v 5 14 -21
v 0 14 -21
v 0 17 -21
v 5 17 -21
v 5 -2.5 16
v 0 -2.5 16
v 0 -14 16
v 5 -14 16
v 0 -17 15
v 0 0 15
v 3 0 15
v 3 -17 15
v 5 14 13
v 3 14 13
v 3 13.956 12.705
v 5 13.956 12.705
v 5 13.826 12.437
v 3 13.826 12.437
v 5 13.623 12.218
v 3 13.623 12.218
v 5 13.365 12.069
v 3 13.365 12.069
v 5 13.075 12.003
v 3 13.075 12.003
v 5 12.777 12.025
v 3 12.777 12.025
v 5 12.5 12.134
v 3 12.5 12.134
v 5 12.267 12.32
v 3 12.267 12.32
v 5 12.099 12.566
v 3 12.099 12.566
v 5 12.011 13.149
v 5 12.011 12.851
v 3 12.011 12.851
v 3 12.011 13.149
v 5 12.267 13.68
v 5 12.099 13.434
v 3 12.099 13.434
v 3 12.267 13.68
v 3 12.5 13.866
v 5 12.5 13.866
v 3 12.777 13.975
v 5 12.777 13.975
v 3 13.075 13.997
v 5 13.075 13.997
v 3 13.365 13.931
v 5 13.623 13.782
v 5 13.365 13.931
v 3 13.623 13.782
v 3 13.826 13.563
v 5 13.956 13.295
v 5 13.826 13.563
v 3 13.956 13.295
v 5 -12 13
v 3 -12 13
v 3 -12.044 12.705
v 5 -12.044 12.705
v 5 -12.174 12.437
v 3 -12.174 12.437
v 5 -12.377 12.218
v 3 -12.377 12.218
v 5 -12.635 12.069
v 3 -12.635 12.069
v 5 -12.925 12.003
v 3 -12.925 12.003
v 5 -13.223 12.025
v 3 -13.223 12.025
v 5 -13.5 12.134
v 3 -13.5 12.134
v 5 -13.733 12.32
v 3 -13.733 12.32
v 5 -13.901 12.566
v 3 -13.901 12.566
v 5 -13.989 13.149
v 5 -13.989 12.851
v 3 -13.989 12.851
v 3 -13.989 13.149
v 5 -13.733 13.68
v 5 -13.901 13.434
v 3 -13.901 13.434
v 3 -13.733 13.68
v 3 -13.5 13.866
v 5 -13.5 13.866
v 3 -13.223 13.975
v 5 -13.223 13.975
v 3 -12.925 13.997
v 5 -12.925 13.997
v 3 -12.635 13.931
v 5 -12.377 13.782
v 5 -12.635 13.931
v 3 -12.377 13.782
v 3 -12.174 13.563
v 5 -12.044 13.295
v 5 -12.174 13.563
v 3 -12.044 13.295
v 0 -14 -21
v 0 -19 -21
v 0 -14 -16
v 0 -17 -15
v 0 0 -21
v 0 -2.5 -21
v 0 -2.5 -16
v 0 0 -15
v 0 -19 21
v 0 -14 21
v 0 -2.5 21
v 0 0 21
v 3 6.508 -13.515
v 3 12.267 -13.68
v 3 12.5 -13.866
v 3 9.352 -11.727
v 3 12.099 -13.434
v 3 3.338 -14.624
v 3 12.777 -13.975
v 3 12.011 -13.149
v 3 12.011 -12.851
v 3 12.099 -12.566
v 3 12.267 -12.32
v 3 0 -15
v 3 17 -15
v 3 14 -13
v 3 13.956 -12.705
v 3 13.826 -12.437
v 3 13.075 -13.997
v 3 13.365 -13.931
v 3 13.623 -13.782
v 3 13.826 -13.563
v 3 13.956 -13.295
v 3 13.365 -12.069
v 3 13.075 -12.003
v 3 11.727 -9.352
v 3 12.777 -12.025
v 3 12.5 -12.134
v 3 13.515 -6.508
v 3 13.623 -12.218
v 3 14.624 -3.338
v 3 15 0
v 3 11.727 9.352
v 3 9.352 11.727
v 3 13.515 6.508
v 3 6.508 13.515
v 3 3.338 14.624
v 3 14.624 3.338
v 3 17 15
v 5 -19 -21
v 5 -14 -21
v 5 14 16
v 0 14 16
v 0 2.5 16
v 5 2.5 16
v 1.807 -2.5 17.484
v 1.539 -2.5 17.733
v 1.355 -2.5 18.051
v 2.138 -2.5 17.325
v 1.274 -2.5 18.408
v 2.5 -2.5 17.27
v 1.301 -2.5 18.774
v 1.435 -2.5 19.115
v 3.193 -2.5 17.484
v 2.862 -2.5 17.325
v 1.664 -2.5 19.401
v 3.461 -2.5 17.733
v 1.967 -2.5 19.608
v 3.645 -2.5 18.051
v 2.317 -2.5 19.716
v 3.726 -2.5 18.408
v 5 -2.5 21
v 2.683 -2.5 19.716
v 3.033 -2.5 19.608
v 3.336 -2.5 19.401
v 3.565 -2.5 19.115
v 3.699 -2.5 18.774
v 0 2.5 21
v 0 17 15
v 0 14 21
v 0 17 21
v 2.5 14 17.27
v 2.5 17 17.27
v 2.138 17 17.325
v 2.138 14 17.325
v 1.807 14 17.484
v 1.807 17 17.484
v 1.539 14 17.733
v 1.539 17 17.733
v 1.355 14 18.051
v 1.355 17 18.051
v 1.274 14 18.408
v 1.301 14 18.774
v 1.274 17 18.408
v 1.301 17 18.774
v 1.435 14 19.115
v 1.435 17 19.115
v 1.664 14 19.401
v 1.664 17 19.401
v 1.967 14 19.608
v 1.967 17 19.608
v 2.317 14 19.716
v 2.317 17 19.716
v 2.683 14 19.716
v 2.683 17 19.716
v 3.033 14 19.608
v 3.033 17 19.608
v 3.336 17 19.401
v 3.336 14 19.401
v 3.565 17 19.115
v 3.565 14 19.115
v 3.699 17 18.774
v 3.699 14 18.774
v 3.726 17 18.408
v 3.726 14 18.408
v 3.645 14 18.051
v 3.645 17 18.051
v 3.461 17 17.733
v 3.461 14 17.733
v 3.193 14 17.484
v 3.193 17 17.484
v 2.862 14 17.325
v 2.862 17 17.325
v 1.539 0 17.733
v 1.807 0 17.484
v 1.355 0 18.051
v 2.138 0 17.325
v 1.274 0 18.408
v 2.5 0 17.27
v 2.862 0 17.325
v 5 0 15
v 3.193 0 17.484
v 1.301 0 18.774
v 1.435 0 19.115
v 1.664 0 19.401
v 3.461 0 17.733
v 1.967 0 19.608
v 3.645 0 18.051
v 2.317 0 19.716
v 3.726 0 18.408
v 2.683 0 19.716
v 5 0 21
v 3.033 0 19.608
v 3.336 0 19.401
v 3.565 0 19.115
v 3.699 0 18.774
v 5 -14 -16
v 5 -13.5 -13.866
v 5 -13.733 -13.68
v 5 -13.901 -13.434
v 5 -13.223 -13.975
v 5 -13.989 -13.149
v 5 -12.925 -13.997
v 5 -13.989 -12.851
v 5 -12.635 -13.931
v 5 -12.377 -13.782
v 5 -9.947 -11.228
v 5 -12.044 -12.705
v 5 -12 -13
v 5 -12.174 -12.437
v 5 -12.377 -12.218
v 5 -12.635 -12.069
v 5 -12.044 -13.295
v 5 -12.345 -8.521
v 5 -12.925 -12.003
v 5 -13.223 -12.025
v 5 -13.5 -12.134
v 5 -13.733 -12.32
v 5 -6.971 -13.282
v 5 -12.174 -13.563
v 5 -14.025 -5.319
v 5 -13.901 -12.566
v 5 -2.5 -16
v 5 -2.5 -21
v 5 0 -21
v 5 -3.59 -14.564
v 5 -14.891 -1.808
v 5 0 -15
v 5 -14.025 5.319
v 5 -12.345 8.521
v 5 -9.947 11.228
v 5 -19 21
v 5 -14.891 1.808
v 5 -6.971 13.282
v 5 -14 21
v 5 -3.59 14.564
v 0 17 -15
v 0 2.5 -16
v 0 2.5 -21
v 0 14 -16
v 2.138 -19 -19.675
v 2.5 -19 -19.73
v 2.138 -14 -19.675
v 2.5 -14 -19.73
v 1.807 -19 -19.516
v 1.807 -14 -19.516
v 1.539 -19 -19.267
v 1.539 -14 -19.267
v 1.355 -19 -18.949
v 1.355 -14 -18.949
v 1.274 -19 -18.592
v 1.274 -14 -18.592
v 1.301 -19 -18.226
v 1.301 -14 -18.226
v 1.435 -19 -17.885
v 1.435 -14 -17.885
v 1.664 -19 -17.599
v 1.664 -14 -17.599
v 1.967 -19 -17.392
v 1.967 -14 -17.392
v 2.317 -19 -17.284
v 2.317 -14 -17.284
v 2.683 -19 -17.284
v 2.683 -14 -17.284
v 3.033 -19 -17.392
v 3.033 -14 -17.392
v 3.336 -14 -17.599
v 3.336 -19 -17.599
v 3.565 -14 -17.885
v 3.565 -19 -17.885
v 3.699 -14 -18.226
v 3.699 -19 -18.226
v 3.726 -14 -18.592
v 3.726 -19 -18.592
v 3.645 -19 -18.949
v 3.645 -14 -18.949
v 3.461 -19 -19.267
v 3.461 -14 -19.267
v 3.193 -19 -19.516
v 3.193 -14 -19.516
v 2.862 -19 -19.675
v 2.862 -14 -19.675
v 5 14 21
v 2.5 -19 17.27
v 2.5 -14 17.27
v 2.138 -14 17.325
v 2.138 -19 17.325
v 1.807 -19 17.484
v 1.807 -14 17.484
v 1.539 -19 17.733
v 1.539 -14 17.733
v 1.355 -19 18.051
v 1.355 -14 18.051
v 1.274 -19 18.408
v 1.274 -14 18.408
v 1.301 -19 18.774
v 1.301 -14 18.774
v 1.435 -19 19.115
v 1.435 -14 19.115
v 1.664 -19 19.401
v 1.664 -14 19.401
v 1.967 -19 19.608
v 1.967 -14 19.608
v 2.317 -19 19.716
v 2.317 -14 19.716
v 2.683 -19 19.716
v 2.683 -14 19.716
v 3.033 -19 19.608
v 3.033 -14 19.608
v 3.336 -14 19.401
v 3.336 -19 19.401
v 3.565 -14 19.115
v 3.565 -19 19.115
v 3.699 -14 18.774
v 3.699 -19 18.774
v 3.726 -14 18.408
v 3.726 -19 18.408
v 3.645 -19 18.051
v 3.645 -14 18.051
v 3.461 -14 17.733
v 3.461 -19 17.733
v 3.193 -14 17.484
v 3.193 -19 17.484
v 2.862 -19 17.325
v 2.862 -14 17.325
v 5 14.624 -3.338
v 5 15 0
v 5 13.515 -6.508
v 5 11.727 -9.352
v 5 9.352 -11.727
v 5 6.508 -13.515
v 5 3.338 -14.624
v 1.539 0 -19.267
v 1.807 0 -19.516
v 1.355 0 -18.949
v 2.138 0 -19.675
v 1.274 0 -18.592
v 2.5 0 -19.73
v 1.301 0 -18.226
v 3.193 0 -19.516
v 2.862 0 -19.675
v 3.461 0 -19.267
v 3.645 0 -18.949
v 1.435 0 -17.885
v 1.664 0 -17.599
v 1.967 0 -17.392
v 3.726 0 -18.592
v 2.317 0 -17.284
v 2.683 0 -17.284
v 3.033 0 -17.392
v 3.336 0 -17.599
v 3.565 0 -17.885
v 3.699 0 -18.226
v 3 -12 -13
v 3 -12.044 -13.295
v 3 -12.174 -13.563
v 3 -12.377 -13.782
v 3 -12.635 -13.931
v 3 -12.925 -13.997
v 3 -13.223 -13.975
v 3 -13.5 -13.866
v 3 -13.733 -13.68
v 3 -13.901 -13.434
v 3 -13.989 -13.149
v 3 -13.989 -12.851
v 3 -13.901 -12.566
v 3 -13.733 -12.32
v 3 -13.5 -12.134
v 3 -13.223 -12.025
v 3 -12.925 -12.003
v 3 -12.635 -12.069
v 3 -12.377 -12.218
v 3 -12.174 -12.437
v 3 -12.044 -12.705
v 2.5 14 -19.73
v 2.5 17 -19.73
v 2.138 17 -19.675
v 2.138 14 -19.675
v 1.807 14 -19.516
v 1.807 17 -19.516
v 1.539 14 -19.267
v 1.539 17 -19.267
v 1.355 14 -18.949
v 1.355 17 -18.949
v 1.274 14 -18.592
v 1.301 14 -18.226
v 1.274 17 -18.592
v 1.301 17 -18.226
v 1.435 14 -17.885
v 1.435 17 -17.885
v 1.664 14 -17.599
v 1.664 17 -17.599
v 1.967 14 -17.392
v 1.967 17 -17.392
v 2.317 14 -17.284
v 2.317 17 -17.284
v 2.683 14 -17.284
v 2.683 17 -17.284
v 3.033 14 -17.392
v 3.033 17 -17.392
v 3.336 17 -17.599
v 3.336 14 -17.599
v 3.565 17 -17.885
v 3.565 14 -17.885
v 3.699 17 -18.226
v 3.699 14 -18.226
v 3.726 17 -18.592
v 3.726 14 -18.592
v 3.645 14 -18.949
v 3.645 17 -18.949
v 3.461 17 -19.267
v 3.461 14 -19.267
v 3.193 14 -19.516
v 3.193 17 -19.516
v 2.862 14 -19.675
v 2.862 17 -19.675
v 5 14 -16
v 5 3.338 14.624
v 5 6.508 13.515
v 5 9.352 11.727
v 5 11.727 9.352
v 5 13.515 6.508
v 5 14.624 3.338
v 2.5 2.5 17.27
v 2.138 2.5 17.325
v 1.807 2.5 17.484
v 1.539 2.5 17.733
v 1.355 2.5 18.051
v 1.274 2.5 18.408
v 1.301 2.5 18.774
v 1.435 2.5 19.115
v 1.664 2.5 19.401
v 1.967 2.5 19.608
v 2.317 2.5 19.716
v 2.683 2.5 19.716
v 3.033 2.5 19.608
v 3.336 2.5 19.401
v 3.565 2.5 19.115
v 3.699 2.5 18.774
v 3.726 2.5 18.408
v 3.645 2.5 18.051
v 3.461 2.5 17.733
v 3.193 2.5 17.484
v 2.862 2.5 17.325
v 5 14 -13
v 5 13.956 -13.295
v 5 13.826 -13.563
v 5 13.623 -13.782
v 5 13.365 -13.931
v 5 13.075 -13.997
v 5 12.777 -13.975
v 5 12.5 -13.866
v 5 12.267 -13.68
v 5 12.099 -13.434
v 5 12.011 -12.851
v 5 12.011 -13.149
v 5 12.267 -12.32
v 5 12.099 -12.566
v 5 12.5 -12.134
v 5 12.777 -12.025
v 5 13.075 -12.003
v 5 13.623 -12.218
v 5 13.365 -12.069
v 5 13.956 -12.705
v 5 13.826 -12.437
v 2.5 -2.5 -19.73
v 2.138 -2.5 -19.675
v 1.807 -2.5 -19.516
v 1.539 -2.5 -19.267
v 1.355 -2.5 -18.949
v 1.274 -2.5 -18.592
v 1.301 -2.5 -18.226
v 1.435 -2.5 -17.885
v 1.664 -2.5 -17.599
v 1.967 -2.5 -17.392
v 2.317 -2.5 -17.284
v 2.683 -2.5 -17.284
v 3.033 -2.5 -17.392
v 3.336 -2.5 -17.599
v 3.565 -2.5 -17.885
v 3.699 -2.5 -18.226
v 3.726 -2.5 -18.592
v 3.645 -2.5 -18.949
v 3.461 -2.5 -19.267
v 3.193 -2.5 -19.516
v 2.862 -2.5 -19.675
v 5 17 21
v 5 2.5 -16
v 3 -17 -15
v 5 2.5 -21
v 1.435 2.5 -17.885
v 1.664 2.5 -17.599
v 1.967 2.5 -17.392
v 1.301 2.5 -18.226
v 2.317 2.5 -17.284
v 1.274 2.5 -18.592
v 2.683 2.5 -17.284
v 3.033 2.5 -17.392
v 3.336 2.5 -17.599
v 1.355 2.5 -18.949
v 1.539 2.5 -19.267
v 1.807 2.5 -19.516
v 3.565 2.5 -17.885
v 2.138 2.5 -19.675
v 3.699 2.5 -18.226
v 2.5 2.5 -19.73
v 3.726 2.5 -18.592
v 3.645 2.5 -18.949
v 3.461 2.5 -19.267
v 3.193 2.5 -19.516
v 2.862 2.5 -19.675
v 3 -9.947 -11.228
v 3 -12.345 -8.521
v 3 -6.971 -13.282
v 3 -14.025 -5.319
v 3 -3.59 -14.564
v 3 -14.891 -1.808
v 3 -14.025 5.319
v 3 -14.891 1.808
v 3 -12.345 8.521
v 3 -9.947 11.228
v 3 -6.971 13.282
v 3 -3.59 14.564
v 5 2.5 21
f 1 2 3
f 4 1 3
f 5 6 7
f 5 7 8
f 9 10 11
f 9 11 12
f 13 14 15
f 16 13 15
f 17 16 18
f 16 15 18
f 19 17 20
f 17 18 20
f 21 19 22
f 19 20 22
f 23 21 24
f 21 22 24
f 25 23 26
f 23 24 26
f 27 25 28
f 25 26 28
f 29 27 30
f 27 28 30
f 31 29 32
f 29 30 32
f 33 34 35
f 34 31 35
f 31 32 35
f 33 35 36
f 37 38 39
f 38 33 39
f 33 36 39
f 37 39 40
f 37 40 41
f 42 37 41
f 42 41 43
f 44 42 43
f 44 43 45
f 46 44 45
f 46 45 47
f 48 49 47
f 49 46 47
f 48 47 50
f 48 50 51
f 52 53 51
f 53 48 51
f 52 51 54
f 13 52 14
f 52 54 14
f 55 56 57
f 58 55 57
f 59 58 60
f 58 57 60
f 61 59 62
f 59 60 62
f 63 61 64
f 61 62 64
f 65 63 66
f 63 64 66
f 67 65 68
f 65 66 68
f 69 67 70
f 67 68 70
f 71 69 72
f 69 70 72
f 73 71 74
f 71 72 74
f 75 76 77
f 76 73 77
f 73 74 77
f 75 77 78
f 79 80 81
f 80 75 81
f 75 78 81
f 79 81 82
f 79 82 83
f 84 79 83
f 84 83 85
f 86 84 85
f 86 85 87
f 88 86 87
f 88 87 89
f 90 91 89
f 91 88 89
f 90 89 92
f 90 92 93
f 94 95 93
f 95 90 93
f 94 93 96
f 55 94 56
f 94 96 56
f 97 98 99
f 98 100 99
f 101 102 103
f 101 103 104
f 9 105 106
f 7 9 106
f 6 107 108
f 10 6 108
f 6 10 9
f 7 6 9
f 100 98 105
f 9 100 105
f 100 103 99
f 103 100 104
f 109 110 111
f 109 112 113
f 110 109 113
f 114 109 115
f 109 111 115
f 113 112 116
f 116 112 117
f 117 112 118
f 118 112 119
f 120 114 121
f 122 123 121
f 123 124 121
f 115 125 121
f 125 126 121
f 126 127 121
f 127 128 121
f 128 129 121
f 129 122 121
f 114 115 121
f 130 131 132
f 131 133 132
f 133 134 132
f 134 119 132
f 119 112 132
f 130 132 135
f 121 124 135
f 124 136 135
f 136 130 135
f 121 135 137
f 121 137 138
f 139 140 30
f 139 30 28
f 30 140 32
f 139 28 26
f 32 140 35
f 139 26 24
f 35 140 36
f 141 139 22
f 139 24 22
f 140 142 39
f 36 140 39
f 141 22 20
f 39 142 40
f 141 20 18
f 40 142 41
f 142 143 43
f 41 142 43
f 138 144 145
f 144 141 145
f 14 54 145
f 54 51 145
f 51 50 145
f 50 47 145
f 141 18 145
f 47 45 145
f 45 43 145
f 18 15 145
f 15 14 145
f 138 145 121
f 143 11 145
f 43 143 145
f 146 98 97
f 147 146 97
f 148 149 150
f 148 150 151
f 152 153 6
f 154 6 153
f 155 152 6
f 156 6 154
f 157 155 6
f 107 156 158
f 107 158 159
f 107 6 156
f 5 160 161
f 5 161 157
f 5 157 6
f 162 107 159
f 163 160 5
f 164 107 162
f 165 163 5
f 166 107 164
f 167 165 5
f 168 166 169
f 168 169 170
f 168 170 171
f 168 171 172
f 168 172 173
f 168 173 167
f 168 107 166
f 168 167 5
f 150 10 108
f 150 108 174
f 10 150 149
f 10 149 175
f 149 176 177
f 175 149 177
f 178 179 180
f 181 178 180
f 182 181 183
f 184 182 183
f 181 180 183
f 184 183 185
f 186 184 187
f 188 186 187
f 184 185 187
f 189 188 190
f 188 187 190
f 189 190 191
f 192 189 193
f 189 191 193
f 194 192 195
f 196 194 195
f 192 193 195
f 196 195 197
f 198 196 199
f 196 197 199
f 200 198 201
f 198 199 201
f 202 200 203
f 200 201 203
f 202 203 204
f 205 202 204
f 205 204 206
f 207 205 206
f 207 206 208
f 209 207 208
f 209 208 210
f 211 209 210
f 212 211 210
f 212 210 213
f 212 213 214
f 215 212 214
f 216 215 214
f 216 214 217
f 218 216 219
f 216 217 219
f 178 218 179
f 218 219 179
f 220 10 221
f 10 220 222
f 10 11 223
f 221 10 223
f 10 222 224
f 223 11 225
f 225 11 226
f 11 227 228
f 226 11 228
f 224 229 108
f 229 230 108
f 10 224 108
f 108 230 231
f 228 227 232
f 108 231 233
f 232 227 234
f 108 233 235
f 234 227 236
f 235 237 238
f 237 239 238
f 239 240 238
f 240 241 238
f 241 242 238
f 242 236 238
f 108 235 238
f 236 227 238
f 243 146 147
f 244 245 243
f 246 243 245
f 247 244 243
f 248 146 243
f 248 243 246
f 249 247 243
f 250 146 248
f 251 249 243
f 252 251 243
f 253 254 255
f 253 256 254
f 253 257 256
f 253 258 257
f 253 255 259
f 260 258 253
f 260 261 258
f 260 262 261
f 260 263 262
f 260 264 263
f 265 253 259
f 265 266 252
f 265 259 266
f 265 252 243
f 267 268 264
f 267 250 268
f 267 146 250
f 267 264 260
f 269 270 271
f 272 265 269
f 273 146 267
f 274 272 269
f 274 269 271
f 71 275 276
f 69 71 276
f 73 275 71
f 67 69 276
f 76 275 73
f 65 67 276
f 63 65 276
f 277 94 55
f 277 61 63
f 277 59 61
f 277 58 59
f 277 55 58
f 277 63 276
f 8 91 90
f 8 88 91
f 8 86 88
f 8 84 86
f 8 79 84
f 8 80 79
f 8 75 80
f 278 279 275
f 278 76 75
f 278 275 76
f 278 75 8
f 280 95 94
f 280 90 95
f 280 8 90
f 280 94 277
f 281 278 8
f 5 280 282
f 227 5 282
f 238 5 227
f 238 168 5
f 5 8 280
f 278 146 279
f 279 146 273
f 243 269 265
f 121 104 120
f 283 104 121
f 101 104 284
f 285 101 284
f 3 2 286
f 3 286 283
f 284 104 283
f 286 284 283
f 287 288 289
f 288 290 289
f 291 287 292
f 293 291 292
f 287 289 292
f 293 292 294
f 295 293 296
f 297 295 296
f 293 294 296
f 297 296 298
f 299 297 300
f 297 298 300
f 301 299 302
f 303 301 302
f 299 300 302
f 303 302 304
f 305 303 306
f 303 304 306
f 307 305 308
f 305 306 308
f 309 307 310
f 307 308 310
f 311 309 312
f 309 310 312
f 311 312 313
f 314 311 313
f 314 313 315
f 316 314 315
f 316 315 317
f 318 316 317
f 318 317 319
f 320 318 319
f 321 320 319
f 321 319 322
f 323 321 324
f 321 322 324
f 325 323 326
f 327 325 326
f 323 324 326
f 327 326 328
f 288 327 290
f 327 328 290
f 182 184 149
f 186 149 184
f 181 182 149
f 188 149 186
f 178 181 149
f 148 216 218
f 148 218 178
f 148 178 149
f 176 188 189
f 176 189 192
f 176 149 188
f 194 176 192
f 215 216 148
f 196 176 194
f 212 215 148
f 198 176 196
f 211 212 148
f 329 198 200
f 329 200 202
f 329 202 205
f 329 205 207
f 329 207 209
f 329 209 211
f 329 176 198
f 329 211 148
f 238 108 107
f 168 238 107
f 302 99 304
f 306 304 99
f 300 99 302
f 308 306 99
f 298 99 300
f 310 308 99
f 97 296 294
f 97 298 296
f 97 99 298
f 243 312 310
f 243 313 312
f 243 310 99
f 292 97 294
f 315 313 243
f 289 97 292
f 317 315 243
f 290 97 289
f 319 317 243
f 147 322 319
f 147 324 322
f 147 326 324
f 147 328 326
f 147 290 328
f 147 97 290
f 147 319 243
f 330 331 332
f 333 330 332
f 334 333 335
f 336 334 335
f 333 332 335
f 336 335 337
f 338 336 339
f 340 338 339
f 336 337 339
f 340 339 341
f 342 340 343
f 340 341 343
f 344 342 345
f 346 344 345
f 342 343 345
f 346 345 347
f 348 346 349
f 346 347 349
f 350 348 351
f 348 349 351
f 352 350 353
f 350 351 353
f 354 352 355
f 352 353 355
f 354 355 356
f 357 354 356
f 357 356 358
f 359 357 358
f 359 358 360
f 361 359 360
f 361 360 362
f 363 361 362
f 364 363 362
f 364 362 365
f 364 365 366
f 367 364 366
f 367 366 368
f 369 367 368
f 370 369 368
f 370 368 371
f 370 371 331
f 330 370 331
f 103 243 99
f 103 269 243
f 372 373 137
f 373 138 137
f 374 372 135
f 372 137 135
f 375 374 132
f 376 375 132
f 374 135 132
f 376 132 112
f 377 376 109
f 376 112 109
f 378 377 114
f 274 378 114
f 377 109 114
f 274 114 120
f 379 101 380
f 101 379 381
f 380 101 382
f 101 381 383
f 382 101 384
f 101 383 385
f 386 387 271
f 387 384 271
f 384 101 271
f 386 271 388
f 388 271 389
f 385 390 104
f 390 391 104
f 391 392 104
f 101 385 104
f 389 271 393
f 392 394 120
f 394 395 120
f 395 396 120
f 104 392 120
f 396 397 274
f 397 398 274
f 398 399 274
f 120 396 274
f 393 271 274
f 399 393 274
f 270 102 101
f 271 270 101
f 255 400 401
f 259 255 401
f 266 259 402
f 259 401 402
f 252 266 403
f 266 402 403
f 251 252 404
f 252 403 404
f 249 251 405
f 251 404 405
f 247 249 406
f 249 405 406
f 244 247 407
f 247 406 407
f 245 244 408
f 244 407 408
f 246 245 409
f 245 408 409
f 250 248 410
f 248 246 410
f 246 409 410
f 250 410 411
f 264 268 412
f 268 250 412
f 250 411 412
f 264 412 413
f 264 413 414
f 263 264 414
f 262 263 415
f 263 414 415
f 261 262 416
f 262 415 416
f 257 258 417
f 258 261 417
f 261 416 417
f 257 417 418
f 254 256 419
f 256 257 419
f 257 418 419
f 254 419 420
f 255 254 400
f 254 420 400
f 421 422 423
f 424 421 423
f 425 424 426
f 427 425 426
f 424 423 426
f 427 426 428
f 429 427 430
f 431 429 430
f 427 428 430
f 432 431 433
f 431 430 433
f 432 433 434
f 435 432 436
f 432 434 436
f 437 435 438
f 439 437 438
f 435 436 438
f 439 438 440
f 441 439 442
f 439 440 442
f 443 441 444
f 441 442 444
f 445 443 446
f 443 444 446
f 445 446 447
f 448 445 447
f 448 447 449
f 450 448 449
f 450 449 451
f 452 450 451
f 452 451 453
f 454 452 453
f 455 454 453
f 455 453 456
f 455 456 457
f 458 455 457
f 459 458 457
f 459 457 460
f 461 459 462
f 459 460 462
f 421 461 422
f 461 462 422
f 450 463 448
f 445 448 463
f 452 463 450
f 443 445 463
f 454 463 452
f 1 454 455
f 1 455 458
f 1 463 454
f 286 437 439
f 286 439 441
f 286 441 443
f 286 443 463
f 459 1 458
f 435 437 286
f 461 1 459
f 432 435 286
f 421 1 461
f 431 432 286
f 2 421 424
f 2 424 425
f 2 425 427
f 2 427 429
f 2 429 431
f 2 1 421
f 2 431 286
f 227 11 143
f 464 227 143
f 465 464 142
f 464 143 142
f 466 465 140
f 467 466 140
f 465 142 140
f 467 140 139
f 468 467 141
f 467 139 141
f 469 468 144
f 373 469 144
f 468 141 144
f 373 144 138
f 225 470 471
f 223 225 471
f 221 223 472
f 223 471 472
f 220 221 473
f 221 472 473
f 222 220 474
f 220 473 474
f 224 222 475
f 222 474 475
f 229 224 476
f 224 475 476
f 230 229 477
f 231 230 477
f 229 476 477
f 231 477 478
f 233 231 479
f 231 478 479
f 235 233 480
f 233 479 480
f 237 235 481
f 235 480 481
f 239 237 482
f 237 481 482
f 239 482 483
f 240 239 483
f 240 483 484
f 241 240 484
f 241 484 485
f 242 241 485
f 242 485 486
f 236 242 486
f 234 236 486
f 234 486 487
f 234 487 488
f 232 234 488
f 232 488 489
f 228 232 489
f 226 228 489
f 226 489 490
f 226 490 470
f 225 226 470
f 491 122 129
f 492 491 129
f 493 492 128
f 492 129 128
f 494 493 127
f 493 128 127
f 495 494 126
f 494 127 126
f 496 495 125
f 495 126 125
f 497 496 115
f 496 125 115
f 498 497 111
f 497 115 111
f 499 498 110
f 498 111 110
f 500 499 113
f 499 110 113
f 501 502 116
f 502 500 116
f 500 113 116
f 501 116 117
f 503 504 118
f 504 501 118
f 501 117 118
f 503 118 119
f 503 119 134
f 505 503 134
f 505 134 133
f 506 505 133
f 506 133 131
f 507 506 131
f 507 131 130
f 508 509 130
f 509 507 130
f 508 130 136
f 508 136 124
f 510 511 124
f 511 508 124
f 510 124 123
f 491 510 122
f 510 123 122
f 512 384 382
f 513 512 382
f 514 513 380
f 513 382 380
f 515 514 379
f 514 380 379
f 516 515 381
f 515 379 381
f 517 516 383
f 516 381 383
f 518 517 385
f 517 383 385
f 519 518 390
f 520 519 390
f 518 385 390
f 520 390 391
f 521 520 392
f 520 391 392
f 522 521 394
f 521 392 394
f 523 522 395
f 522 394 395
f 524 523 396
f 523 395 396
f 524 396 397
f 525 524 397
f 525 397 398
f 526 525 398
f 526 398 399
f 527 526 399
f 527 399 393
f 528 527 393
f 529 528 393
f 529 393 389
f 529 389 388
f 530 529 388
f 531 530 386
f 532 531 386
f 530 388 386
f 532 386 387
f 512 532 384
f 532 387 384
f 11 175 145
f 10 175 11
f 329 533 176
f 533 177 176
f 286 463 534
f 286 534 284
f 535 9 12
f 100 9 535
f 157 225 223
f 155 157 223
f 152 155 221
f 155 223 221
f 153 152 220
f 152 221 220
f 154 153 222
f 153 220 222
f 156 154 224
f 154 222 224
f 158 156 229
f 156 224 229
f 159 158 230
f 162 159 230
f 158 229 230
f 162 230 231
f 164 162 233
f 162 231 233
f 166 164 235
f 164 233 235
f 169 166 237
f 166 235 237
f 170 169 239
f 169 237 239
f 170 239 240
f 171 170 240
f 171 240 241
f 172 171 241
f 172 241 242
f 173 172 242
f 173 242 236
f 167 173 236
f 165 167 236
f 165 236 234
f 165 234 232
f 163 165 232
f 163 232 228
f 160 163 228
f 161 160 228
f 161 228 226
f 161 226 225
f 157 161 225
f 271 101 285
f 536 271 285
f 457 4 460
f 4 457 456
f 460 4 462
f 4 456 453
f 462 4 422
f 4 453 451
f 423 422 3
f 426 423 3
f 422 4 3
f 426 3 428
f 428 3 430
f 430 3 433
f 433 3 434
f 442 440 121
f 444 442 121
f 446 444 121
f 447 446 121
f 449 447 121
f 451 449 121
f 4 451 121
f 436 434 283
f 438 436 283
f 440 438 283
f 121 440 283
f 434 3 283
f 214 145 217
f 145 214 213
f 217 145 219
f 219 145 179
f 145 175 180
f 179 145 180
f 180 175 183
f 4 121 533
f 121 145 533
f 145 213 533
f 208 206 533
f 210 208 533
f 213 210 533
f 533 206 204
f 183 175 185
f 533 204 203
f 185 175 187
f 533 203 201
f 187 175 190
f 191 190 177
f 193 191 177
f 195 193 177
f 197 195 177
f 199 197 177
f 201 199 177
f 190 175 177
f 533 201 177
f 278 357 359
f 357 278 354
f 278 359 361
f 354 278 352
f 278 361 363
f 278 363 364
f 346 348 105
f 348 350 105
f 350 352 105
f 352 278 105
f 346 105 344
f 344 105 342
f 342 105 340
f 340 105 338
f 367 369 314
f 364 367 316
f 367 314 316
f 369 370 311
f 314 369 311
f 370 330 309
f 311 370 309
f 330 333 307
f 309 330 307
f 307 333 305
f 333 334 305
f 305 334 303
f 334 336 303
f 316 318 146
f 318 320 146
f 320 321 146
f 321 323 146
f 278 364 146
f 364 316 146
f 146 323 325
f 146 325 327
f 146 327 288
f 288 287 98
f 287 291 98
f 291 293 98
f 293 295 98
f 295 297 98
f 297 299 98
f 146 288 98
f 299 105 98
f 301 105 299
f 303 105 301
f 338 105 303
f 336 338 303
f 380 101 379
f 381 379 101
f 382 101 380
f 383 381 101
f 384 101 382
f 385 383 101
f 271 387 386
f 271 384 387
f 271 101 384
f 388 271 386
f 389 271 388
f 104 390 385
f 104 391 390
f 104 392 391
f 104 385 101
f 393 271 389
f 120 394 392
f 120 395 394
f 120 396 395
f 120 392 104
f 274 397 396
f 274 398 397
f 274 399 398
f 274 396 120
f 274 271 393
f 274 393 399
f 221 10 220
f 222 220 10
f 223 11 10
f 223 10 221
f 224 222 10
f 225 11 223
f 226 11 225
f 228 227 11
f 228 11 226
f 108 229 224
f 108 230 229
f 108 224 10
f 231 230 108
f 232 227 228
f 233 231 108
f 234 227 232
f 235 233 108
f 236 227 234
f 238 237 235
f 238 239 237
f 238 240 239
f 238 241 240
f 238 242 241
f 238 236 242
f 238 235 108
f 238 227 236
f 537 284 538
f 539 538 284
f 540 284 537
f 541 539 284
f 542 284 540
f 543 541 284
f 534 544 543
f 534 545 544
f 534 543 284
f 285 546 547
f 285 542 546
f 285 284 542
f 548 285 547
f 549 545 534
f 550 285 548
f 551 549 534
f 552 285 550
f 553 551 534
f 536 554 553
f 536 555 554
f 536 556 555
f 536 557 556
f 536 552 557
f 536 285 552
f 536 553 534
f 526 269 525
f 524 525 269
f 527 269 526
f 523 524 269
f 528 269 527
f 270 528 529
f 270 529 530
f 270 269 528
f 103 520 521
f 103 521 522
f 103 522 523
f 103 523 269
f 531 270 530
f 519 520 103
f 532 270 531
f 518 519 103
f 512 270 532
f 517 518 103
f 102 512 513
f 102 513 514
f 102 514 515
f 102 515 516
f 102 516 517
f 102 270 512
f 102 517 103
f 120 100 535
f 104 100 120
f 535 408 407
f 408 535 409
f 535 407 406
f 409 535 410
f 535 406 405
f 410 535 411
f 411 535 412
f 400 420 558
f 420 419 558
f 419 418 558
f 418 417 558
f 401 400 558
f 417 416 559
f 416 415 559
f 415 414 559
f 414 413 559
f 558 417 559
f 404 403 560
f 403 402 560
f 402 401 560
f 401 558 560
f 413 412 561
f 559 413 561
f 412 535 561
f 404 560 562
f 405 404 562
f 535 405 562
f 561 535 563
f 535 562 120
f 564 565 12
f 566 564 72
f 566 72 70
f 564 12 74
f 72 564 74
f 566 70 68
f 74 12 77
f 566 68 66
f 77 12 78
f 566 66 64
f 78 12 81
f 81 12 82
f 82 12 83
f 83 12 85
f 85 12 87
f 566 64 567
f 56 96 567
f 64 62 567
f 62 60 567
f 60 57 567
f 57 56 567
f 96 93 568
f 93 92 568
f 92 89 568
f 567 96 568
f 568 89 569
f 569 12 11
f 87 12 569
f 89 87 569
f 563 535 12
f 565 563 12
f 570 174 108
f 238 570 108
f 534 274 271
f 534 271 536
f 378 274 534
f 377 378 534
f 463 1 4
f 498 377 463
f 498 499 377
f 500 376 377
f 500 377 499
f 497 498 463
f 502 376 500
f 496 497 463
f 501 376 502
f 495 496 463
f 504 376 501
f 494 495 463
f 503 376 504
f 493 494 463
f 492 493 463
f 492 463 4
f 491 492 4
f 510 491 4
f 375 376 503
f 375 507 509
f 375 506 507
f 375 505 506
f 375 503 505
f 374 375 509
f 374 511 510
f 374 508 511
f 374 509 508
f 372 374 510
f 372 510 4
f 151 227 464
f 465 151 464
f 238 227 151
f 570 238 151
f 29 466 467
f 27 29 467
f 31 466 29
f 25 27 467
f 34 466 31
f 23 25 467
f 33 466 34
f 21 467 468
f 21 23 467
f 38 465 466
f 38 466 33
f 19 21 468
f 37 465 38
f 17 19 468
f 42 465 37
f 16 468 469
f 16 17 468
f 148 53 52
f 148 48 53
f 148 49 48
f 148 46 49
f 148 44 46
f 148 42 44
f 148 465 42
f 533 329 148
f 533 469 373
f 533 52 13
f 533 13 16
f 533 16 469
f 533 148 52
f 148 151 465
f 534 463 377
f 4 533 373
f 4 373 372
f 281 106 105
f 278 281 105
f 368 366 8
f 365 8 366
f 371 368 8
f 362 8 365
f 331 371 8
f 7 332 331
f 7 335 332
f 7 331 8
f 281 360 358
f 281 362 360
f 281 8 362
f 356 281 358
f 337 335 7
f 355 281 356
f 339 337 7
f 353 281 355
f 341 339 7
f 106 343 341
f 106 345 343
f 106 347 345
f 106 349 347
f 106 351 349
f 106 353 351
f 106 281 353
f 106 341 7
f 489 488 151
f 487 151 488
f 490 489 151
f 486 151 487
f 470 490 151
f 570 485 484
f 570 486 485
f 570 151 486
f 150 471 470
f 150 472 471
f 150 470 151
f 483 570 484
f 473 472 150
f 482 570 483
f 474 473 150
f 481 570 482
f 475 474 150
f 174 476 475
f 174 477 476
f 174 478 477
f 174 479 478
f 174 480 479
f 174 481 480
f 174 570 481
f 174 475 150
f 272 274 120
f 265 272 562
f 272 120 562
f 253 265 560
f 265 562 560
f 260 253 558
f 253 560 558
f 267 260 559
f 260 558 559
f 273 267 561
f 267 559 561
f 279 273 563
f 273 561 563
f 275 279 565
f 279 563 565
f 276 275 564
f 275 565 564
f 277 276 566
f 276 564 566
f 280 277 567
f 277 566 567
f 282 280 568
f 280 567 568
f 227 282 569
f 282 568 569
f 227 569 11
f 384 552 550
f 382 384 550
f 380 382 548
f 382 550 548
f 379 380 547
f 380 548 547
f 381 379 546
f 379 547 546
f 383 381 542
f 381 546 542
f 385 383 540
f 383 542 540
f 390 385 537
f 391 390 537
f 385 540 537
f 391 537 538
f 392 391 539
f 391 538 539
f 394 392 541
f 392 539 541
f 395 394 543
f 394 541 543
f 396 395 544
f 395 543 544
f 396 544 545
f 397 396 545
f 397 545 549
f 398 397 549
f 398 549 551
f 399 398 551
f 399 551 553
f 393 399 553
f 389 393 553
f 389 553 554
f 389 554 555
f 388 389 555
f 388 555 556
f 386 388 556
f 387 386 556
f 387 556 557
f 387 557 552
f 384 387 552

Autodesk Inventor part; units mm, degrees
ref_plane "YZ Plane" through (0, 0, 0) normal (1, 0, 0) x (0, 1, 0)
ref_plane "XZ Plane" through (0, 0, 0) normal (0, 1, 0) x (-1, 0, 0)
ref_plane "XY Plane" through (0, 0, 0) normal (0, 0, 1) x (1, 0, 0)
sketch "Sketch1" plane through (0, 0, 0) normal (1, 0, 0) x (0, 1, 0)
  circle A0 centre (0, 0) radius 15
  line L0 (15, 15) -> (-15, 15)
  line L1 (-15, 15) -> (-15, -15) construction
  line L2 (-15, -15) -> (15, -15)
  line L3 (15, -15) -> (15, 15) construction
  line L4 (15, 15) -> (-15, -15) construction
  line L5 (-15, 15) -> (15, -15) construction
  line L6 (17, 21) -> (-17, 21)
  line L7 (-17, 21) -> (-17, -21)
  line L8 (-17, -21) -> (17, -21)
  line L9 (17, -21) -> (17, 21)
  line L10 (17, 21) -> (-17, -21) construction
  line L11 (-17, 21) -> (17, -21) construction
  circle A1 centre (13, -13) radius 1
  circle A2 centre (13, 13) radius 1
  circle A3 centre (-13, -13) radius 1
  circle A4 centre (-13, 13) radius 1
  line L12 (17, -15) -> (15, -15)
  line L13 (-15, -15) -> (-17, -15)
  line L14 (17, 15) -> (15, 15)
  line L15 (-15, 15) -> (-17, 15)
  line L16 (-17, 21) -> (-19, 21)
  line L17 (-19, 21) -> (-19, -21)
  line L18 (-19, -21) -> (-17, -21)
  line L19 (-17, -21) -> (-17, 21)
  point P0 (0, -15)
  point P1 (0, 15)
  dimension "d0" = 30
  dimension "d1" = 42
  dimension "d2" = 34
  dimension "d10" = 2
  dimension "d11" = 2
  dimension "d14" = 26
  dimension "d17" = 26
  dimension "d44" = 2
sketch "Sketch2" plane through (0, 0, 0) normal (0, 1, 0) x (-1, 0, 0)
  line L0 (190, 50) -> (-10, 50)
  line L1 (-10, 50) -> (-10, -50)
  line L2 (-10, -50) -> (190, -50)
  line L3 (190, -50) -> (190, 50)
  point P0 (0, 0)
  point P1 (-10, 0)
  dimension "d3" = 200
  dimension "d4" = 100
  dimension "d5" = 10
extrude "Extrusion1" add sketch "Sketch1" along normal blind 5 contours A0 | A0 L0 L14 L9 L12 L2 | L0 L15 L7 L6 L9 L14 | A0 L2 L13 L7 L15 L0 | L2 L12 L9 L8 L7 L13 | A1 | A2 | A3 | A4
extrude "Extrusion4" cut sketch "Sketch1" along normal blind 3 contours A0 L0 L14 L9 L12 L2 | A0 L2 L13 L7 L15 L0
extrude "Extrusion3" cut sketch "Sketch1" along normal blind 5 contours A0 | A1 | A2 | A3 | A4
sketch "Sketch3" plane through (0, -17, 21) normal (0, 0, 1) x (1, 0, 0)
  line L0 (0, 34) -> (0, 0) projected
  line L1 (0, 0) -> (5, 0) projected
  line L2 (5, 34) -> (5, 0) projected
  line L3 (0, 0) -> (0, 34) projected
  line L4 (5, 0) -> (5, 34) projected
  line L5 (0, 14.5) -> (5, 14.5)
  line L6 (5, 14.5) -> (5, 3)
  line L7 (5, 3) -> (0, 3)
  line L8 (0, 3) -> (0, 14.5)
  line L9 (0, 31) -> (5, 31)
  line L10 (5, 31) -> (5, 19.5)
  line L11 (5, 19.5) -> (0, 19.5)
  line L12 (0, 19.5) -> (0, 31)
  line L13 (0, 34) -> (5, 34) projected
  point P0 (0, 17)
  point P1 (0, 17)
  point P2 (0, 3)
  point P3 (5, 3)
  point P4 (0, 19.5)
  dimension "d26" = 3
  dimension "d27" = 5
  dimension "d29" = 2.5
  dimension "d43" = 3
extrude "Extrusion5" cut sketch "Sketch3" against normal blind 5 contours L9 L2 L11 L0 | L5 L2 L7 L0
mirror "Mirror1" about plane through (0, 0, 0) normal (0, 0, 1) of "Extrusion5"
extrude "Extrusion6" add sketch "Sketch1" along normal blind 5 contours L7 L18 L17 L16
sketch "Sketch5" plane through (0, -19, -21) normal (0, -1, 0) x (1, 0, 0)
  line L0 (0, 42) -> (5, 42) projected
  line L1 (0, 42) -> (0, 0) projected
  line L2 (0, 0) -> (5, 0) projected
  point P0 (0, 21)
  point P1 (2.5, 2.5)
  point P2 (2.5, 39.5)
  dimension "d54" = 2.5
  dimension "d55" = 2.5
  dimension "d56" = 2.5
  dimension "d57" = 2.5
hole "Hole2" at (2.5, -19, -18.5) at (2.5, -19, 18.5) direction (0, 1, 0) diameter 2.459 end through all thread size "M3x0.5" class "6H" standard "ISO Metric profile"
split body "Split1" result two bodies by plane through (0, 0, 0) normal (0, 1, 0) first body at (4.5, 16.3333, 0)
properties part number "Camera holder2"
